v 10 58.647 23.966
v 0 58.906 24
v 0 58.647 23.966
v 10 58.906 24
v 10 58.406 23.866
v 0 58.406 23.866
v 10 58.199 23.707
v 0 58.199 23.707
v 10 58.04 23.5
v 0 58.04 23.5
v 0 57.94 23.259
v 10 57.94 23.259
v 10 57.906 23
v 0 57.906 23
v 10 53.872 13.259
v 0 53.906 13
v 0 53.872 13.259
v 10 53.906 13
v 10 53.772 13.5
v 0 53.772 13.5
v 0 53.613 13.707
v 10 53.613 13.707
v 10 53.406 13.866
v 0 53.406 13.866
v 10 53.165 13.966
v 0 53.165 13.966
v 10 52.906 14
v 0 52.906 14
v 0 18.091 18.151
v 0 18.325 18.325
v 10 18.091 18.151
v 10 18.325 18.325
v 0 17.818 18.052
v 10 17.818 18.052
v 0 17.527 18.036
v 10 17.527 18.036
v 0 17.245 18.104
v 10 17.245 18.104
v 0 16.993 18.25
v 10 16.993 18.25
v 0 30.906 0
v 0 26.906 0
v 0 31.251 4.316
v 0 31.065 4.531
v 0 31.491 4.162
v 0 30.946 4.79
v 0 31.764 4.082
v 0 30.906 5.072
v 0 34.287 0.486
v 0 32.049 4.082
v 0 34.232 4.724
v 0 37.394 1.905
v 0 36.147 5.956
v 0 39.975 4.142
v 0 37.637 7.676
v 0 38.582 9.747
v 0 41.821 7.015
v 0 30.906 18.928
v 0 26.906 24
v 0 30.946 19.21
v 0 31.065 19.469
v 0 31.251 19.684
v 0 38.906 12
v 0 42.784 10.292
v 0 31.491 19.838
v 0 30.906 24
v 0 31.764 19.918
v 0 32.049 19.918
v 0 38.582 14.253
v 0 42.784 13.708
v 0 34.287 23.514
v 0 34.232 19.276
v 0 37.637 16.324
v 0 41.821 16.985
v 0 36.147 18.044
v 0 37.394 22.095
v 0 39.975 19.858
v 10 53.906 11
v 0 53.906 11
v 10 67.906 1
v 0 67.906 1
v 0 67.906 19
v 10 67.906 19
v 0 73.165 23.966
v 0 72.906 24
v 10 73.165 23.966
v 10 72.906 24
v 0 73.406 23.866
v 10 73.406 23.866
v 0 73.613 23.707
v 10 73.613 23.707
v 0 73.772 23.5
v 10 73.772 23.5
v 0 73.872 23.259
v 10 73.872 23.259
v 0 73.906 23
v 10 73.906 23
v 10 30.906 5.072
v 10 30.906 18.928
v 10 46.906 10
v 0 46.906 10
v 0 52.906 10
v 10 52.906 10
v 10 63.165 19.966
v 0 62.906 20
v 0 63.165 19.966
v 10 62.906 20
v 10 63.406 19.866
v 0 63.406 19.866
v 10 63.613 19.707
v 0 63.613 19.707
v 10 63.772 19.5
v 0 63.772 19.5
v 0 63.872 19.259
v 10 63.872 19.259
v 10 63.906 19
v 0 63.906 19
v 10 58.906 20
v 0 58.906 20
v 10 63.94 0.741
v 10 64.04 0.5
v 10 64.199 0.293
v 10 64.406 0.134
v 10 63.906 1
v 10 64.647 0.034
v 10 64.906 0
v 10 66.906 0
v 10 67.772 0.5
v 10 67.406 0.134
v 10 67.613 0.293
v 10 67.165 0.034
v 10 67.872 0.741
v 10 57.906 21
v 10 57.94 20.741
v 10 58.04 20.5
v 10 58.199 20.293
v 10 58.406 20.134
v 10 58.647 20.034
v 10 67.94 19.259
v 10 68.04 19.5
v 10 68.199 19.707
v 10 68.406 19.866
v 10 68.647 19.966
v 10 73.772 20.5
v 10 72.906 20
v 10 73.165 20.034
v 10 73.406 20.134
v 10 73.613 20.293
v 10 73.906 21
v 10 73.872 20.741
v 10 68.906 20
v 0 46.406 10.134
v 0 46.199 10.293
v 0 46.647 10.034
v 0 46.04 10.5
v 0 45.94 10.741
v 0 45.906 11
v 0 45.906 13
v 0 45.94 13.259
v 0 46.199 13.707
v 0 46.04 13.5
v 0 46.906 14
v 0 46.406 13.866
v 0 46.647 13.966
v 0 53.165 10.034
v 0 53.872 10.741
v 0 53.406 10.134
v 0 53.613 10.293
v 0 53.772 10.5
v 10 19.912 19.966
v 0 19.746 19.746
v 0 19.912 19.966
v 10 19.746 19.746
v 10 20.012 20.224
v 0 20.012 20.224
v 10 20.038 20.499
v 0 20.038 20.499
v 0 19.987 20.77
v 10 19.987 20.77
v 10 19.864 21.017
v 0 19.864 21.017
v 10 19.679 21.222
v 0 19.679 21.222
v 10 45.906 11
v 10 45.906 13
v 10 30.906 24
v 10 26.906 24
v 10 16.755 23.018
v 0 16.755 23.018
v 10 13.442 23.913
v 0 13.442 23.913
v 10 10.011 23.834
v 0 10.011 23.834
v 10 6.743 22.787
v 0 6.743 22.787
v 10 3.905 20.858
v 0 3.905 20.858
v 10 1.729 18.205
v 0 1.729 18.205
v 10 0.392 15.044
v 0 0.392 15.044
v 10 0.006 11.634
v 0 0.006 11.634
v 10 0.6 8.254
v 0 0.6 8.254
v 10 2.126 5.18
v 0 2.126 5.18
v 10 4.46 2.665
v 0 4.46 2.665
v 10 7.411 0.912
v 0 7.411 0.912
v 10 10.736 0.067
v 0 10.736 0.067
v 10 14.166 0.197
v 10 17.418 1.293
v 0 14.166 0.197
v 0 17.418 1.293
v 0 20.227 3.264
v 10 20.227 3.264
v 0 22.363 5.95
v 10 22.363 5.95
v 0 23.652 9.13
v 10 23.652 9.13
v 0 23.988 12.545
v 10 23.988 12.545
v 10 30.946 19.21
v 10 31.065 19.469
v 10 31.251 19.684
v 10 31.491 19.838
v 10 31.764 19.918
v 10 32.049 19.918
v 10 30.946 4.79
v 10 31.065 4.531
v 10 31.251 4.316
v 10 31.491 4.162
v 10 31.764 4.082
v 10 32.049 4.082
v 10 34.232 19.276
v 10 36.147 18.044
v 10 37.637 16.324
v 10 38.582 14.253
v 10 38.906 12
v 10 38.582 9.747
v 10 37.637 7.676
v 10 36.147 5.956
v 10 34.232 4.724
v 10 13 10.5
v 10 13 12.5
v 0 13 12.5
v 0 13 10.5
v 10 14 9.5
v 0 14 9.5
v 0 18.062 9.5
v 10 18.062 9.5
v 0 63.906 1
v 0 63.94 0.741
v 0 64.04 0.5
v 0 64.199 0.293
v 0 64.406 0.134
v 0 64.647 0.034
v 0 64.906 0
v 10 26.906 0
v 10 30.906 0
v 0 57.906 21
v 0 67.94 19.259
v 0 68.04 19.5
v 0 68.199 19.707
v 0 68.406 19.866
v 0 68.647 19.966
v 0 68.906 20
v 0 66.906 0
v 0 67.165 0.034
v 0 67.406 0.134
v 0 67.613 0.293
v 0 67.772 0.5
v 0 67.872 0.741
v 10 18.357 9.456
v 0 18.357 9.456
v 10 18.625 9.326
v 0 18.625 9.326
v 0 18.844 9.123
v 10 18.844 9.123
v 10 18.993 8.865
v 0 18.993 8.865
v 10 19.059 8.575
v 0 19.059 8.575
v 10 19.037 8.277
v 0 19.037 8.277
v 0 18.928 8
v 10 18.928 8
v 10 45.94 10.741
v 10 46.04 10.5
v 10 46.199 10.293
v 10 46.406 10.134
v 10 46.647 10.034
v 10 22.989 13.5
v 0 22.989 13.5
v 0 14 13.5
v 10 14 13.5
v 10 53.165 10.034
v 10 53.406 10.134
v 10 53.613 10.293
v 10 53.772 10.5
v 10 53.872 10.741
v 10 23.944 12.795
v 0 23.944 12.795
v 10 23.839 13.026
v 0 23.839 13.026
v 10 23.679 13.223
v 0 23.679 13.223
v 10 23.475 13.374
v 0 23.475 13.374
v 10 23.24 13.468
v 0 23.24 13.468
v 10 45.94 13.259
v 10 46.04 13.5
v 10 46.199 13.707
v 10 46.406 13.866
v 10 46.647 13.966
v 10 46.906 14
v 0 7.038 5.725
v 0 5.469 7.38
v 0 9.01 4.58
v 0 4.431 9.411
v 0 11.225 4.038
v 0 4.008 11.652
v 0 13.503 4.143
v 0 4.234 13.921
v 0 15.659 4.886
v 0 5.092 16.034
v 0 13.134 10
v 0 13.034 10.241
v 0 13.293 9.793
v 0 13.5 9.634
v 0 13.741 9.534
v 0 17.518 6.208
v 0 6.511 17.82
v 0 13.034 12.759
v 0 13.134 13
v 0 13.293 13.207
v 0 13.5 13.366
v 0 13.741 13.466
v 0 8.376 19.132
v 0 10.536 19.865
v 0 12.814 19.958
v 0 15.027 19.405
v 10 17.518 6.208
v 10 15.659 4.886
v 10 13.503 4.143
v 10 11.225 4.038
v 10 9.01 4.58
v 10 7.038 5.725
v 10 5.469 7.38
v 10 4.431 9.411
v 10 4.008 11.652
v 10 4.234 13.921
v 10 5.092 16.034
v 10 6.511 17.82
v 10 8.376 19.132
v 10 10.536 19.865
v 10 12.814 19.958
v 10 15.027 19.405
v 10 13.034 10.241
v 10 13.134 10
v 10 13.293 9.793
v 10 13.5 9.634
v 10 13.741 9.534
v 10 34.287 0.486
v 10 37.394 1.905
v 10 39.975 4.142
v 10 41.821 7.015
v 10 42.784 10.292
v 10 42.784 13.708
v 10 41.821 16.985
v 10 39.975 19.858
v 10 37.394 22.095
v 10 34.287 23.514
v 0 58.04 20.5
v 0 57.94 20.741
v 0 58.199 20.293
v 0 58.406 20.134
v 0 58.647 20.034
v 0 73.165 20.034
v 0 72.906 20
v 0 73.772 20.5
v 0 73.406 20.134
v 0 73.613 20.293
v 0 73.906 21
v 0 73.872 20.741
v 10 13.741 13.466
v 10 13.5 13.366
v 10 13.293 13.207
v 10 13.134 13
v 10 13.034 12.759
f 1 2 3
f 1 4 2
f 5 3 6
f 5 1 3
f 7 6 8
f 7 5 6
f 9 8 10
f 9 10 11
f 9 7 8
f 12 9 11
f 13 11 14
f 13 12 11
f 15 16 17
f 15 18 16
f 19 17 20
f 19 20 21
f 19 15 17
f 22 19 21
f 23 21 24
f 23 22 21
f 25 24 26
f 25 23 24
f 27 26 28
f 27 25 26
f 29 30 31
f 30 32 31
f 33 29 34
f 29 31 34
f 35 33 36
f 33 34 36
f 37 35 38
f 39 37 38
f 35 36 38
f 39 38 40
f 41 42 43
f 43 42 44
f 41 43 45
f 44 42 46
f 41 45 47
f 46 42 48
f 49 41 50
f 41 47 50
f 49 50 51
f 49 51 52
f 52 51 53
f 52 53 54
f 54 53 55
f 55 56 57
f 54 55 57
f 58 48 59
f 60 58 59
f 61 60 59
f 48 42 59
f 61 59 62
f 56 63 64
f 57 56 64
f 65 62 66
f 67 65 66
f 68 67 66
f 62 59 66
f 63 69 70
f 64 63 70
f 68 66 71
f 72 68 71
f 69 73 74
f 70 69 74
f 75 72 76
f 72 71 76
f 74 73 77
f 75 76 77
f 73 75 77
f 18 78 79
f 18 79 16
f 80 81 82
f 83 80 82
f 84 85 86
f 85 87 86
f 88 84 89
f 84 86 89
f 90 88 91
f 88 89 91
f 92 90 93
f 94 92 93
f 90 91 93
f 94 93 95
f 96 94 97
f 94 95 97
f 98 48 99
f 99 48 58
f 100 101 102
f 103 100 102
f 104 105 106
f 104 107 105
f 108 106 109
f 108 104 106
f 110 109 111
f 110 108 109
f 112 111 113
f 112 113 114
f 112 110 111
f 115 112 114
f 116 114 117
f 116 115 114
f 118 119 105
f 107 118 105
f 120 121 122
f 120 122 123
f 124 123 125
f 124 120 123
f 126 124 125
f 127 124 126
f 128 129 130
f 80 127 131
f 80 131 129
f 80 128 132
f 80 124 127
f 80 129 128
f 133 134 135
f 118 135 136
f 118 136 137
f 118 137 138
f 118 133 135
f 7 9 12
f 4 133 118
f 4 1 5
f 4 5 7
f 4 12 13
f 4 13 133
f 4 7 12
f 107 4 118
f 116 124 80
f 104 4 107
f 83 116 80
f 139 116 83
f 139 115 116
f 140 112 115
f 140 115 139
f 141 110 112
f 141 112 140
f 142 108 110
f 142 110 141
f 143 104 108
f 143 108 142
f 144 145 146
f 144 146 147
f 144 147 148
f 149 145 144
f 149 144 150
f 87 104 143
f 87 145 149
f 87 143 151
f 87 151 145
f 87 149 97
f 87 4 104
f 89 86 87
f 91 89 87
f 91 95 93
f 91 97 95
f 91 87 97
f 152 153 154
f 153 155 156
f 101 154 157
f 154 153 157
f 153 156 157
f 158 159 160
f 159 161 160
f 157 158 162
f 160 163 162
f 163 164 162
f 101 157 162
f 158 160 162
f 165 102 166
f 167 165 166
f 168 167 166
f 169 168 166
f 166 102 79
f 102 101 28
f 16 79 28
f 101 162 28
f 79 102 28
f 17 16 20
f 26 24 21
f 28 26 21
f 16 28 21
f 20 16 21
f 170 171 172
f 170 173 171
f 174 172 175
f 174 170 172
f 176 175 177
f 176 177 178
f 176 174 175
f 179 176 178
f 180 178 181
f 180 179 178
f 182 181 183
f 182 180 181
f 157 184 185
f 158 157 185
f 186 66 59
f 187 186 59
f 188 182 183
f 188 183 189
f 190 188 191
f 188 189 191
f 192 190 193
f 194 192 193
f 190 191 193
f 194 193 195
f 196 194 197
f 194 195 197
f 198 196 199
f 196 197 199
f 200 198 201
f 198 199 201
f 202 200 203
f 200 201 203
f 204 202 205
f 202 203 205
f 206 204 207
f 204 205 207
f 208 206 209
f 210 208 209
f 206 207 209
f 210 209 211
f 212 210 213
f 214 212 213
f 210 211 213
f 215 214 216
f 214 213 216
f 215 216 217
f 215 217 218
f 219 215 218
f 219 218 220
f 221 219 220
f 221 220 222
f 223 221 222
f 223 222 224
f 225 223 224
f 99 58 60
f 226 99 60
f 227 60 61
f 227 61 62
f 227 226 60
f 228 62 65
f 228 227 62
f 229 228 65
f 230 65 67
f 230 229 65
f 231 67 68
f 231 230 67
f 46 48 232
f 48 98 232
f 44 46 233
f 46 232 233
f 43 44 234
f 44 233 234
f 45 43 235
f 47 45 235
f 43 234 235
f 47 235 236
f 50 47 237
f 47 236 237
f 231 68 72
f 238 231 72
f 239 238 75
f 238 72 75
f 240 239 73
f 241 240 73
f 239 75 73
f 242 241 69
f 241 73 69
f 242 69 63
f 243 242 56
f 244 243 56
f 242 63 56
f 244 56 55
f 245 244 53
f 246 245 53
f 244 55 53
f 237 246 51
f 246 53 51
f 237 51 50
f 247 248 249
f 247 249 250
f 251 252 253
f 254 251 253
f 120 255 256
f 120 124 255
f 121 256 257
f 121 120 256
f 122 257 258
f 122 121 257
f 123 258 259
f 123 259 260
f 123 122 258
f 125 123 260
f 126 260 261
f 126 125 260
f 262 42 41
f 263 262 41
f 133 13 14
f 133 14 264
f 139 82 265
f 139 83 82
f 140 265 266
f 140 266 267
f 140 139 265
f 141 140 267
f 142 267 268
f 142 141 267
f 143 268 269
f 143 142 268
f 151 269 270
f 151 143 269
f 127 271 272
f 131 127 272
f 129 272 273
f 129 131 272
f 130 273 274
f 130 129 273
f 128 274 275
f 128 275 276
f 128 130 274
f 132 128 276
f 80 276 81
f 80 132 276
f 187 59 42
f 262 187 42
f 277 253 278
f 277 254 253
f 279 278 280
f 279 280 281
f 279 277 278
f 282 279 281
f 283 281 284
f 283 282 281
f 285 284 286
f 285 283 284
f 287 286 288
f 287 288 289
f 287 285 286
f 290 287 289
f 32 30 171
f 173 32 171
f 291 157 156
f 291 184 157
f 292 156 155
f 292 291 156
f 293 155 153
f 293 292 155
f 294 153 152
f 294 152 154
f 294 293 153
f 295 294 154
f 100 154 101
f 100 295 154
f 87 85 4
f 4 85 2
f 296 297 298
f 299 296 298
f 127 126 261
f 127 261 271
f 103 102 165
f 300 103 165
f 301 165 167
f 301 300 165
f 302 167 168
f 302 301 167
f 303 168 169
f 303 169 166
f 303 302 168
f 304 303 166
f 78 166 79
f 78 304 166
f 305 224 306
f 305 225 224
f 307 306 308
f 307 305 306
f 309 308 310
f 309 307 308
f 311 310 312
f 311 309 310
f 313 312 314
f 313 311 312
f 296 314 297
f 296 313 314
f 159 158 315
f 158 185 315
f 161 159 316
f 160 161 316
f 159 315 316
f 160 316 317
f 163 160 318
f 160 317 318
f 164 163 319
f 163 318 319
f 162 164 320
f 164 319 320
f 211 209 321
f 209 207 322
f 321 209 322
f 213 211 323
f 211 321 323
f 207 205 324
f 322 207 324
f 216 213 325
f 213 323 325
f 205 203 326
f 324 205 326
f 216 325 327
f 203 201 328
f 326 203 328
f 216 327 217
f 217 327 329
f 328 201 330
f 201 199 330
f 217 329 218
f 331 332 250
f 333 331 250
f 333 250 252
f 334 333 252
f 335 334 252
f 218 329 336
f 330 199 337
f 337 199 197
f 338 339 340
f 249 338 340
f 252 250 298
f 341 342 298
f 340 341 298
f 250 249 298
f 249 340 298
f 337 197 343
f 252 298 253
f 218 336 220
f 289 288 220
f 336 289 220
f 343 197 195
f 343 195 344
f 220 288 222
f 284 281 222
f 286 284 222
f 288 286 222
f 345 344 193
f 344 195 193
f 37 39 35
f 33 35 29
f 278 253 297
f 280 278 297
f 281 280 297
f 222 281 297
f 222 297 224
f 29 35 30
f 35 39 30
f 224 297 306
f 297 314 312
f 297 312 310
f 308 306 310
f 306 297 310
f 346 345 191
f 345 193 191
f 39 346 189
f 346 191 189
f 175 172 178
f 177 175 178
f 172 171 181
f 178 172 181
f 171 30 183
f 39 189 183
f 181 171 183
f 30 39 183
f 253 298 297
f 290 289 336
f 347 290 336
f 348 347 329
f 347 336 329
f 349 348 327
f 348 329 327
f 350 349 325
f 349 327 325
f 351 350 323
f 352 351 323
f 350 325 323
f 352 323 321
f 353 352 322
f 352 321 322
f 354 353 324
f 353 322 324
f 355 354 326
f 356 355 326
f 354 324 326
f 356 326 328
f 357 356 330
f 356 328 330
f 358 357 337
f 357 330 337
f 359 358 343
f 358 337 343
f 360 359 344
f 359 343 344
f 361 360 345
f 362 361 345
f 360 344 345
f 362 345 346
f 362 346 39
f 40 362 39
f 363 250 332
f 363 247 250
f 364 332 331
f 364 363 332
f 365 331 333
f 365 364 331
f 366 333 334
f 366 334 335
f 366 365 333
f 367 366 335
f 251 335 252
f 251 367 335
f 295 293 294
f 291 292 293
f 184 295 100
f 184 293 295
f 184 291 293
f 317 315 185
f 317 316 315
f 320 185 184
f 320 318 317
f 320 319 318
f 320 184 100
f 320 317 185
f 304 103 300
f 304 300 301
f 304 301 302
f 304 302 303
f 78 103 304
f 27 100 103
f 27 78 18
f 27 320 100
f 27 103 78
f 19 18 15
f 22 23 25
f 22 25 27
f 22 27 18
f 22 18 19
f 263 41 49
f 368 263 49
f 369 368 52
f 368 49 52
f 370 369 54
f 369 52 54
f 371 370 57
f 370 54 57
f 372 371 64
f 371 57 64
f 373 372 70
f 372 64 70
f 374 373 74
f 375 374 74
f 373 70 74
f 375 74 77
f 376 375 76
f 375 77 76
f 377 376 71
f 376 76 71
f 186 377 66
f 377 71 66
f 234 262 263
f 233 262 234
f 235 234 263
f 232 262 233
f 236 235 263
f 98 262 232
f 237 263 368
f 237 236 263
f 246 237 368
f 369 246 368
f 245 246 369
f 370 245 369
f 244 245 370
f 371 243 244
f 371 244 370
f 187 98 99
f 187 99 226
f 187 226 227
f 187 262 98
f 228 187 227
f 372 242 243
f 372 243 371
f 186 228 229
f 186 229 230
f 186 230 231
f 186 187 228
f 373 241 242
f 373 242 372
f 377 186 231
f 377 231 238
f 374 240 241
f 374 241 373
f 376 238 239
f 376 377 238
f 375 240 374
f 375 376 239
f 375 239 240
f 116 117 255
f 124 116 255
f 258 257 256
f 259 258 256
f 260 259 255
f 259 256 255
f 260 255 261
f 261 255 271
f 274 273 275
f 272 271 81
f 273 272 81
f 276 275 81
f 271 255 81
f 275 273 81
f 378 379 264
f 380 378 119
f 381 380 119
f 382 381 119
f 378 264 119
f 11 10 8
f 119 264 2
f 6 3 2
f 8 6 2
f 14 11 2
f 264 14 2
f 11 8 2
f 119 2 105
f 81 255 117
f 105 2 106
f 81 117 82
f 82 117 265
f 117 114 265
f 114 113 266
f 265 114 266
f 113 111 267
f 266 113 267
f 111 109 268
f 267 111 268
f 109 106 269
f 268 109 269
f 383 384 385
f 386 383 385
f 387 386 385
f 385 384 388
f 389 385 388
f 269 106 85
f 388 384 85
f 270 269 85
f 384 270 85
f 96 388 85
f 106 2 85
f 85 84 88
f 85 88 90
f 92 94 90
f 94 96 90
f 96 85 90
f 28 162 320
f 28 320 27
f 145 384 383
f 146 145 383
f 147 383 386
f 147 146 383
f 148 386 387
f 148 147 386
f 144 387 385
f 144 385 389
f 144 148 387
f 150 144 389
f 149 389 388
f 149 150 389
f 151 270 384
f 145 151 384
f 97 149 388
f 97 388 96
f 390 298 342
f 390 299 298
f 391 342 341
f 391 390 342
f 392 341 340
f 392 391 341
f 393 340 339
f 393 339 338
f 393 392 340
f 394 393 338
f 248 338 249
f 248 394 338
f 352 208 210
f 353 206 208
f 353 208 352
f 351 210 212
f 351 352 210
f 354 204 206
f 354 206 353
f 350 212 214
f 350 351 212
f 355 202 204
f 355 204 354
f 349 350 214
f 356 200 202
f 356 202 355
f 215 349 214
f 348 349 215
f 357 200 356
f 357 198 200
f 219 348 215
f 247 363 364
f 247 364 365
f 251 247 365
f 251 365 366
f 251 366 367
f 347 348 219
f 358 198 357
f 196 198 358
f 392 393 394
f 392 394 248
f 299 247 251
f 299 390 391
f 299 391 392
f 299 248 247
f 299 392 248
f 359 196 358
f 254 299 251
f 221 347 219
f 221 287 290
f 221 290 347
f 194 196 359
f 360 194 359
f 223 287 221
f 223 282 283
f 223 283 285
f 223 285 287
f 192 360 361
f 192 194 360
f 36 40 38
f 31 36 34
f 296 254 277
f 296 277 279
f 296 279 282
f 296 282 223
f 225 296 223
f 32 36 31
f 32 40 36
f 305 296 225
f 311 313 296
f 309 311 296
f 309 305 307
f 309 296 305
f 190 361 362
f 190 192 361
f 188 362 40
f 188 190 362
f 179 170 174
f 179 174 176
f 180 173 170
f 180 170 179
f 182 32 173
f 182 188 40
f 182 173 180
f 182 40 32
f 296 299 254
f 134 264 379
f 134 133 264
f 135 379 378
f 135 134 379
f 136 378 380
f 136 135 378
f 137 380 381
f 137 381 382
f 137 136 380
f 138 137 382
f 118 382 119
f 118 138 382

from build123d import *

# Parameters (mm, degrees)
F1_DEPTH = 10
F0_W     = 8
F0_H     = 4
F2_R     = 1
F3_R     = 1
F4_R     = 1
F4_2_R   = 1
F4_3_R   = 1


with BuildPart() as f1:
    # F0 (on Right) → F1 (new body)
    with BuildSketch(Plane.YZ):
        with BuildLine():
            Line((17.6568542495, 17.6568542495), (20.4852813742, 20.4852813742))
            ThreePointArc((20.4852813742, 20.4852813742), (1.2227826555, 6.7225397861), (23.9058808998, 13.5))
            Line((23.9058808998, 13.5), (13, 13.5))
            Line((13, 13.5), (13, 9.5))
            Line((13, 9.5), (19.5993420768, 9.5))
            ThreePointArc((19.5993420768, 9.5), (4.217631911, 10.1466929753), (17.6568542495, 17.6568542495))
        make_face()
    extrude(amount=F1_DEPTH)

    # F3
    f3_edges = [f1.edges().sort_by_distance(p)[0] for p in [
        (5, 19.599342, 9.5),
        (5, 13, 9.5),
        (5, 13, 13.5),
        (5, 23.905881, 13.5),
        (5, 20.485281, 20.485281),
        (5, 17.656854, 17.656854),
    ]]
    fillet(f3_edges, radius=F3_R)


with BuildPart() as f1b:
    # F0 (on Right) → F1, piece 2 (new body)
    with BuildSketch(Plane.YZ):
        with BuildLine():
            Line((26.9058808998, 0), (30.9058808998, 0))
            ThreePointArc((30.9058808998, 0), (42.9058808998, 12), (30.9058808998, 24))
            Line((30.9058808998, 24), (26.9058808998, 24))
            Line((26.9058808998, 24), (26.9058808998, 0))
        make_face()
        with BuildLine():
            ThreePointArc((30.9058808998, 20), (38.9058808998, 12), (30.9058808998, 4))
            Line((30.9058808998, 4), (30.9058808998, 20))
        make_face(mode=Mode.SUBTRACT)
    extrude(amount=F1_DEPTH)

    # F2
    f2_edges = [f1b.edges().sort_by_distance(p)[0] for p in [
        (5, 30.905881, 4),
    ]]
    fillet(f2_edges, radius=F2_R)

    # F4#3
    f4_3_edges = [f1b.edges().sort_by_distance(p)[0] for p in [
        (5, 30.905881, 20),
    ]]
    fillet(f4_3_edges, radius=F4_3_R)


with BuildPart() as f1c:
    # F0 (on Right) → F1, piece 3 (new body)
    with BuildSketch(Plane.YZ):
        with Locations((49.9058808998, 12)):
            Rectangle(F0_W, F0_H)
    extrude(amount=F1_DEPTH)

    # F4
    f4_edges = [f1c.edges().sort_by_distance(p)[0] for p in [
        (5, 53.905881, 14),
        (5, 45.905881, 14),
        (5, 53.905881, 10),
        (5, 45.905881, 10),
    ]]
    fillet(f4_edges, radius=F4_R)


with BuildPart() as f1d:
    # F0 (on Right) → F1, piece 4 (new body)
    with BuildSketch(Plane.YZ):
        Polygon((73.9058808998, 24), (57.9058808998, 24), (57.9058808998, 20), (63.9058808998, 20), (63.9058808998, 0), (67.9058808998, 0), (67.9058808998, 20), (73.9058808998, 20), align=None)
    extrude(amount=F1_DEPTH)

    # F4#2
    f4_2_edges = [f1d.edges().sort_by_distance(p)[0] for p in [
        (5, 67.905881, 20),
        (5, 63.905881, 20),
        (5, 57.905881, 20),
        (5, 57.905881, 24),
        (5, 73.905881, 24),
        (5, 73.905881, 20),
        (5, 67.905881, 0),
        (5, 63.905881, 0),
    ]]
    fillet(f4_2_edges, radius=F4_2_R)


solid = Compound([f1.part, f1b.part, f1c.part, f1d.part])
